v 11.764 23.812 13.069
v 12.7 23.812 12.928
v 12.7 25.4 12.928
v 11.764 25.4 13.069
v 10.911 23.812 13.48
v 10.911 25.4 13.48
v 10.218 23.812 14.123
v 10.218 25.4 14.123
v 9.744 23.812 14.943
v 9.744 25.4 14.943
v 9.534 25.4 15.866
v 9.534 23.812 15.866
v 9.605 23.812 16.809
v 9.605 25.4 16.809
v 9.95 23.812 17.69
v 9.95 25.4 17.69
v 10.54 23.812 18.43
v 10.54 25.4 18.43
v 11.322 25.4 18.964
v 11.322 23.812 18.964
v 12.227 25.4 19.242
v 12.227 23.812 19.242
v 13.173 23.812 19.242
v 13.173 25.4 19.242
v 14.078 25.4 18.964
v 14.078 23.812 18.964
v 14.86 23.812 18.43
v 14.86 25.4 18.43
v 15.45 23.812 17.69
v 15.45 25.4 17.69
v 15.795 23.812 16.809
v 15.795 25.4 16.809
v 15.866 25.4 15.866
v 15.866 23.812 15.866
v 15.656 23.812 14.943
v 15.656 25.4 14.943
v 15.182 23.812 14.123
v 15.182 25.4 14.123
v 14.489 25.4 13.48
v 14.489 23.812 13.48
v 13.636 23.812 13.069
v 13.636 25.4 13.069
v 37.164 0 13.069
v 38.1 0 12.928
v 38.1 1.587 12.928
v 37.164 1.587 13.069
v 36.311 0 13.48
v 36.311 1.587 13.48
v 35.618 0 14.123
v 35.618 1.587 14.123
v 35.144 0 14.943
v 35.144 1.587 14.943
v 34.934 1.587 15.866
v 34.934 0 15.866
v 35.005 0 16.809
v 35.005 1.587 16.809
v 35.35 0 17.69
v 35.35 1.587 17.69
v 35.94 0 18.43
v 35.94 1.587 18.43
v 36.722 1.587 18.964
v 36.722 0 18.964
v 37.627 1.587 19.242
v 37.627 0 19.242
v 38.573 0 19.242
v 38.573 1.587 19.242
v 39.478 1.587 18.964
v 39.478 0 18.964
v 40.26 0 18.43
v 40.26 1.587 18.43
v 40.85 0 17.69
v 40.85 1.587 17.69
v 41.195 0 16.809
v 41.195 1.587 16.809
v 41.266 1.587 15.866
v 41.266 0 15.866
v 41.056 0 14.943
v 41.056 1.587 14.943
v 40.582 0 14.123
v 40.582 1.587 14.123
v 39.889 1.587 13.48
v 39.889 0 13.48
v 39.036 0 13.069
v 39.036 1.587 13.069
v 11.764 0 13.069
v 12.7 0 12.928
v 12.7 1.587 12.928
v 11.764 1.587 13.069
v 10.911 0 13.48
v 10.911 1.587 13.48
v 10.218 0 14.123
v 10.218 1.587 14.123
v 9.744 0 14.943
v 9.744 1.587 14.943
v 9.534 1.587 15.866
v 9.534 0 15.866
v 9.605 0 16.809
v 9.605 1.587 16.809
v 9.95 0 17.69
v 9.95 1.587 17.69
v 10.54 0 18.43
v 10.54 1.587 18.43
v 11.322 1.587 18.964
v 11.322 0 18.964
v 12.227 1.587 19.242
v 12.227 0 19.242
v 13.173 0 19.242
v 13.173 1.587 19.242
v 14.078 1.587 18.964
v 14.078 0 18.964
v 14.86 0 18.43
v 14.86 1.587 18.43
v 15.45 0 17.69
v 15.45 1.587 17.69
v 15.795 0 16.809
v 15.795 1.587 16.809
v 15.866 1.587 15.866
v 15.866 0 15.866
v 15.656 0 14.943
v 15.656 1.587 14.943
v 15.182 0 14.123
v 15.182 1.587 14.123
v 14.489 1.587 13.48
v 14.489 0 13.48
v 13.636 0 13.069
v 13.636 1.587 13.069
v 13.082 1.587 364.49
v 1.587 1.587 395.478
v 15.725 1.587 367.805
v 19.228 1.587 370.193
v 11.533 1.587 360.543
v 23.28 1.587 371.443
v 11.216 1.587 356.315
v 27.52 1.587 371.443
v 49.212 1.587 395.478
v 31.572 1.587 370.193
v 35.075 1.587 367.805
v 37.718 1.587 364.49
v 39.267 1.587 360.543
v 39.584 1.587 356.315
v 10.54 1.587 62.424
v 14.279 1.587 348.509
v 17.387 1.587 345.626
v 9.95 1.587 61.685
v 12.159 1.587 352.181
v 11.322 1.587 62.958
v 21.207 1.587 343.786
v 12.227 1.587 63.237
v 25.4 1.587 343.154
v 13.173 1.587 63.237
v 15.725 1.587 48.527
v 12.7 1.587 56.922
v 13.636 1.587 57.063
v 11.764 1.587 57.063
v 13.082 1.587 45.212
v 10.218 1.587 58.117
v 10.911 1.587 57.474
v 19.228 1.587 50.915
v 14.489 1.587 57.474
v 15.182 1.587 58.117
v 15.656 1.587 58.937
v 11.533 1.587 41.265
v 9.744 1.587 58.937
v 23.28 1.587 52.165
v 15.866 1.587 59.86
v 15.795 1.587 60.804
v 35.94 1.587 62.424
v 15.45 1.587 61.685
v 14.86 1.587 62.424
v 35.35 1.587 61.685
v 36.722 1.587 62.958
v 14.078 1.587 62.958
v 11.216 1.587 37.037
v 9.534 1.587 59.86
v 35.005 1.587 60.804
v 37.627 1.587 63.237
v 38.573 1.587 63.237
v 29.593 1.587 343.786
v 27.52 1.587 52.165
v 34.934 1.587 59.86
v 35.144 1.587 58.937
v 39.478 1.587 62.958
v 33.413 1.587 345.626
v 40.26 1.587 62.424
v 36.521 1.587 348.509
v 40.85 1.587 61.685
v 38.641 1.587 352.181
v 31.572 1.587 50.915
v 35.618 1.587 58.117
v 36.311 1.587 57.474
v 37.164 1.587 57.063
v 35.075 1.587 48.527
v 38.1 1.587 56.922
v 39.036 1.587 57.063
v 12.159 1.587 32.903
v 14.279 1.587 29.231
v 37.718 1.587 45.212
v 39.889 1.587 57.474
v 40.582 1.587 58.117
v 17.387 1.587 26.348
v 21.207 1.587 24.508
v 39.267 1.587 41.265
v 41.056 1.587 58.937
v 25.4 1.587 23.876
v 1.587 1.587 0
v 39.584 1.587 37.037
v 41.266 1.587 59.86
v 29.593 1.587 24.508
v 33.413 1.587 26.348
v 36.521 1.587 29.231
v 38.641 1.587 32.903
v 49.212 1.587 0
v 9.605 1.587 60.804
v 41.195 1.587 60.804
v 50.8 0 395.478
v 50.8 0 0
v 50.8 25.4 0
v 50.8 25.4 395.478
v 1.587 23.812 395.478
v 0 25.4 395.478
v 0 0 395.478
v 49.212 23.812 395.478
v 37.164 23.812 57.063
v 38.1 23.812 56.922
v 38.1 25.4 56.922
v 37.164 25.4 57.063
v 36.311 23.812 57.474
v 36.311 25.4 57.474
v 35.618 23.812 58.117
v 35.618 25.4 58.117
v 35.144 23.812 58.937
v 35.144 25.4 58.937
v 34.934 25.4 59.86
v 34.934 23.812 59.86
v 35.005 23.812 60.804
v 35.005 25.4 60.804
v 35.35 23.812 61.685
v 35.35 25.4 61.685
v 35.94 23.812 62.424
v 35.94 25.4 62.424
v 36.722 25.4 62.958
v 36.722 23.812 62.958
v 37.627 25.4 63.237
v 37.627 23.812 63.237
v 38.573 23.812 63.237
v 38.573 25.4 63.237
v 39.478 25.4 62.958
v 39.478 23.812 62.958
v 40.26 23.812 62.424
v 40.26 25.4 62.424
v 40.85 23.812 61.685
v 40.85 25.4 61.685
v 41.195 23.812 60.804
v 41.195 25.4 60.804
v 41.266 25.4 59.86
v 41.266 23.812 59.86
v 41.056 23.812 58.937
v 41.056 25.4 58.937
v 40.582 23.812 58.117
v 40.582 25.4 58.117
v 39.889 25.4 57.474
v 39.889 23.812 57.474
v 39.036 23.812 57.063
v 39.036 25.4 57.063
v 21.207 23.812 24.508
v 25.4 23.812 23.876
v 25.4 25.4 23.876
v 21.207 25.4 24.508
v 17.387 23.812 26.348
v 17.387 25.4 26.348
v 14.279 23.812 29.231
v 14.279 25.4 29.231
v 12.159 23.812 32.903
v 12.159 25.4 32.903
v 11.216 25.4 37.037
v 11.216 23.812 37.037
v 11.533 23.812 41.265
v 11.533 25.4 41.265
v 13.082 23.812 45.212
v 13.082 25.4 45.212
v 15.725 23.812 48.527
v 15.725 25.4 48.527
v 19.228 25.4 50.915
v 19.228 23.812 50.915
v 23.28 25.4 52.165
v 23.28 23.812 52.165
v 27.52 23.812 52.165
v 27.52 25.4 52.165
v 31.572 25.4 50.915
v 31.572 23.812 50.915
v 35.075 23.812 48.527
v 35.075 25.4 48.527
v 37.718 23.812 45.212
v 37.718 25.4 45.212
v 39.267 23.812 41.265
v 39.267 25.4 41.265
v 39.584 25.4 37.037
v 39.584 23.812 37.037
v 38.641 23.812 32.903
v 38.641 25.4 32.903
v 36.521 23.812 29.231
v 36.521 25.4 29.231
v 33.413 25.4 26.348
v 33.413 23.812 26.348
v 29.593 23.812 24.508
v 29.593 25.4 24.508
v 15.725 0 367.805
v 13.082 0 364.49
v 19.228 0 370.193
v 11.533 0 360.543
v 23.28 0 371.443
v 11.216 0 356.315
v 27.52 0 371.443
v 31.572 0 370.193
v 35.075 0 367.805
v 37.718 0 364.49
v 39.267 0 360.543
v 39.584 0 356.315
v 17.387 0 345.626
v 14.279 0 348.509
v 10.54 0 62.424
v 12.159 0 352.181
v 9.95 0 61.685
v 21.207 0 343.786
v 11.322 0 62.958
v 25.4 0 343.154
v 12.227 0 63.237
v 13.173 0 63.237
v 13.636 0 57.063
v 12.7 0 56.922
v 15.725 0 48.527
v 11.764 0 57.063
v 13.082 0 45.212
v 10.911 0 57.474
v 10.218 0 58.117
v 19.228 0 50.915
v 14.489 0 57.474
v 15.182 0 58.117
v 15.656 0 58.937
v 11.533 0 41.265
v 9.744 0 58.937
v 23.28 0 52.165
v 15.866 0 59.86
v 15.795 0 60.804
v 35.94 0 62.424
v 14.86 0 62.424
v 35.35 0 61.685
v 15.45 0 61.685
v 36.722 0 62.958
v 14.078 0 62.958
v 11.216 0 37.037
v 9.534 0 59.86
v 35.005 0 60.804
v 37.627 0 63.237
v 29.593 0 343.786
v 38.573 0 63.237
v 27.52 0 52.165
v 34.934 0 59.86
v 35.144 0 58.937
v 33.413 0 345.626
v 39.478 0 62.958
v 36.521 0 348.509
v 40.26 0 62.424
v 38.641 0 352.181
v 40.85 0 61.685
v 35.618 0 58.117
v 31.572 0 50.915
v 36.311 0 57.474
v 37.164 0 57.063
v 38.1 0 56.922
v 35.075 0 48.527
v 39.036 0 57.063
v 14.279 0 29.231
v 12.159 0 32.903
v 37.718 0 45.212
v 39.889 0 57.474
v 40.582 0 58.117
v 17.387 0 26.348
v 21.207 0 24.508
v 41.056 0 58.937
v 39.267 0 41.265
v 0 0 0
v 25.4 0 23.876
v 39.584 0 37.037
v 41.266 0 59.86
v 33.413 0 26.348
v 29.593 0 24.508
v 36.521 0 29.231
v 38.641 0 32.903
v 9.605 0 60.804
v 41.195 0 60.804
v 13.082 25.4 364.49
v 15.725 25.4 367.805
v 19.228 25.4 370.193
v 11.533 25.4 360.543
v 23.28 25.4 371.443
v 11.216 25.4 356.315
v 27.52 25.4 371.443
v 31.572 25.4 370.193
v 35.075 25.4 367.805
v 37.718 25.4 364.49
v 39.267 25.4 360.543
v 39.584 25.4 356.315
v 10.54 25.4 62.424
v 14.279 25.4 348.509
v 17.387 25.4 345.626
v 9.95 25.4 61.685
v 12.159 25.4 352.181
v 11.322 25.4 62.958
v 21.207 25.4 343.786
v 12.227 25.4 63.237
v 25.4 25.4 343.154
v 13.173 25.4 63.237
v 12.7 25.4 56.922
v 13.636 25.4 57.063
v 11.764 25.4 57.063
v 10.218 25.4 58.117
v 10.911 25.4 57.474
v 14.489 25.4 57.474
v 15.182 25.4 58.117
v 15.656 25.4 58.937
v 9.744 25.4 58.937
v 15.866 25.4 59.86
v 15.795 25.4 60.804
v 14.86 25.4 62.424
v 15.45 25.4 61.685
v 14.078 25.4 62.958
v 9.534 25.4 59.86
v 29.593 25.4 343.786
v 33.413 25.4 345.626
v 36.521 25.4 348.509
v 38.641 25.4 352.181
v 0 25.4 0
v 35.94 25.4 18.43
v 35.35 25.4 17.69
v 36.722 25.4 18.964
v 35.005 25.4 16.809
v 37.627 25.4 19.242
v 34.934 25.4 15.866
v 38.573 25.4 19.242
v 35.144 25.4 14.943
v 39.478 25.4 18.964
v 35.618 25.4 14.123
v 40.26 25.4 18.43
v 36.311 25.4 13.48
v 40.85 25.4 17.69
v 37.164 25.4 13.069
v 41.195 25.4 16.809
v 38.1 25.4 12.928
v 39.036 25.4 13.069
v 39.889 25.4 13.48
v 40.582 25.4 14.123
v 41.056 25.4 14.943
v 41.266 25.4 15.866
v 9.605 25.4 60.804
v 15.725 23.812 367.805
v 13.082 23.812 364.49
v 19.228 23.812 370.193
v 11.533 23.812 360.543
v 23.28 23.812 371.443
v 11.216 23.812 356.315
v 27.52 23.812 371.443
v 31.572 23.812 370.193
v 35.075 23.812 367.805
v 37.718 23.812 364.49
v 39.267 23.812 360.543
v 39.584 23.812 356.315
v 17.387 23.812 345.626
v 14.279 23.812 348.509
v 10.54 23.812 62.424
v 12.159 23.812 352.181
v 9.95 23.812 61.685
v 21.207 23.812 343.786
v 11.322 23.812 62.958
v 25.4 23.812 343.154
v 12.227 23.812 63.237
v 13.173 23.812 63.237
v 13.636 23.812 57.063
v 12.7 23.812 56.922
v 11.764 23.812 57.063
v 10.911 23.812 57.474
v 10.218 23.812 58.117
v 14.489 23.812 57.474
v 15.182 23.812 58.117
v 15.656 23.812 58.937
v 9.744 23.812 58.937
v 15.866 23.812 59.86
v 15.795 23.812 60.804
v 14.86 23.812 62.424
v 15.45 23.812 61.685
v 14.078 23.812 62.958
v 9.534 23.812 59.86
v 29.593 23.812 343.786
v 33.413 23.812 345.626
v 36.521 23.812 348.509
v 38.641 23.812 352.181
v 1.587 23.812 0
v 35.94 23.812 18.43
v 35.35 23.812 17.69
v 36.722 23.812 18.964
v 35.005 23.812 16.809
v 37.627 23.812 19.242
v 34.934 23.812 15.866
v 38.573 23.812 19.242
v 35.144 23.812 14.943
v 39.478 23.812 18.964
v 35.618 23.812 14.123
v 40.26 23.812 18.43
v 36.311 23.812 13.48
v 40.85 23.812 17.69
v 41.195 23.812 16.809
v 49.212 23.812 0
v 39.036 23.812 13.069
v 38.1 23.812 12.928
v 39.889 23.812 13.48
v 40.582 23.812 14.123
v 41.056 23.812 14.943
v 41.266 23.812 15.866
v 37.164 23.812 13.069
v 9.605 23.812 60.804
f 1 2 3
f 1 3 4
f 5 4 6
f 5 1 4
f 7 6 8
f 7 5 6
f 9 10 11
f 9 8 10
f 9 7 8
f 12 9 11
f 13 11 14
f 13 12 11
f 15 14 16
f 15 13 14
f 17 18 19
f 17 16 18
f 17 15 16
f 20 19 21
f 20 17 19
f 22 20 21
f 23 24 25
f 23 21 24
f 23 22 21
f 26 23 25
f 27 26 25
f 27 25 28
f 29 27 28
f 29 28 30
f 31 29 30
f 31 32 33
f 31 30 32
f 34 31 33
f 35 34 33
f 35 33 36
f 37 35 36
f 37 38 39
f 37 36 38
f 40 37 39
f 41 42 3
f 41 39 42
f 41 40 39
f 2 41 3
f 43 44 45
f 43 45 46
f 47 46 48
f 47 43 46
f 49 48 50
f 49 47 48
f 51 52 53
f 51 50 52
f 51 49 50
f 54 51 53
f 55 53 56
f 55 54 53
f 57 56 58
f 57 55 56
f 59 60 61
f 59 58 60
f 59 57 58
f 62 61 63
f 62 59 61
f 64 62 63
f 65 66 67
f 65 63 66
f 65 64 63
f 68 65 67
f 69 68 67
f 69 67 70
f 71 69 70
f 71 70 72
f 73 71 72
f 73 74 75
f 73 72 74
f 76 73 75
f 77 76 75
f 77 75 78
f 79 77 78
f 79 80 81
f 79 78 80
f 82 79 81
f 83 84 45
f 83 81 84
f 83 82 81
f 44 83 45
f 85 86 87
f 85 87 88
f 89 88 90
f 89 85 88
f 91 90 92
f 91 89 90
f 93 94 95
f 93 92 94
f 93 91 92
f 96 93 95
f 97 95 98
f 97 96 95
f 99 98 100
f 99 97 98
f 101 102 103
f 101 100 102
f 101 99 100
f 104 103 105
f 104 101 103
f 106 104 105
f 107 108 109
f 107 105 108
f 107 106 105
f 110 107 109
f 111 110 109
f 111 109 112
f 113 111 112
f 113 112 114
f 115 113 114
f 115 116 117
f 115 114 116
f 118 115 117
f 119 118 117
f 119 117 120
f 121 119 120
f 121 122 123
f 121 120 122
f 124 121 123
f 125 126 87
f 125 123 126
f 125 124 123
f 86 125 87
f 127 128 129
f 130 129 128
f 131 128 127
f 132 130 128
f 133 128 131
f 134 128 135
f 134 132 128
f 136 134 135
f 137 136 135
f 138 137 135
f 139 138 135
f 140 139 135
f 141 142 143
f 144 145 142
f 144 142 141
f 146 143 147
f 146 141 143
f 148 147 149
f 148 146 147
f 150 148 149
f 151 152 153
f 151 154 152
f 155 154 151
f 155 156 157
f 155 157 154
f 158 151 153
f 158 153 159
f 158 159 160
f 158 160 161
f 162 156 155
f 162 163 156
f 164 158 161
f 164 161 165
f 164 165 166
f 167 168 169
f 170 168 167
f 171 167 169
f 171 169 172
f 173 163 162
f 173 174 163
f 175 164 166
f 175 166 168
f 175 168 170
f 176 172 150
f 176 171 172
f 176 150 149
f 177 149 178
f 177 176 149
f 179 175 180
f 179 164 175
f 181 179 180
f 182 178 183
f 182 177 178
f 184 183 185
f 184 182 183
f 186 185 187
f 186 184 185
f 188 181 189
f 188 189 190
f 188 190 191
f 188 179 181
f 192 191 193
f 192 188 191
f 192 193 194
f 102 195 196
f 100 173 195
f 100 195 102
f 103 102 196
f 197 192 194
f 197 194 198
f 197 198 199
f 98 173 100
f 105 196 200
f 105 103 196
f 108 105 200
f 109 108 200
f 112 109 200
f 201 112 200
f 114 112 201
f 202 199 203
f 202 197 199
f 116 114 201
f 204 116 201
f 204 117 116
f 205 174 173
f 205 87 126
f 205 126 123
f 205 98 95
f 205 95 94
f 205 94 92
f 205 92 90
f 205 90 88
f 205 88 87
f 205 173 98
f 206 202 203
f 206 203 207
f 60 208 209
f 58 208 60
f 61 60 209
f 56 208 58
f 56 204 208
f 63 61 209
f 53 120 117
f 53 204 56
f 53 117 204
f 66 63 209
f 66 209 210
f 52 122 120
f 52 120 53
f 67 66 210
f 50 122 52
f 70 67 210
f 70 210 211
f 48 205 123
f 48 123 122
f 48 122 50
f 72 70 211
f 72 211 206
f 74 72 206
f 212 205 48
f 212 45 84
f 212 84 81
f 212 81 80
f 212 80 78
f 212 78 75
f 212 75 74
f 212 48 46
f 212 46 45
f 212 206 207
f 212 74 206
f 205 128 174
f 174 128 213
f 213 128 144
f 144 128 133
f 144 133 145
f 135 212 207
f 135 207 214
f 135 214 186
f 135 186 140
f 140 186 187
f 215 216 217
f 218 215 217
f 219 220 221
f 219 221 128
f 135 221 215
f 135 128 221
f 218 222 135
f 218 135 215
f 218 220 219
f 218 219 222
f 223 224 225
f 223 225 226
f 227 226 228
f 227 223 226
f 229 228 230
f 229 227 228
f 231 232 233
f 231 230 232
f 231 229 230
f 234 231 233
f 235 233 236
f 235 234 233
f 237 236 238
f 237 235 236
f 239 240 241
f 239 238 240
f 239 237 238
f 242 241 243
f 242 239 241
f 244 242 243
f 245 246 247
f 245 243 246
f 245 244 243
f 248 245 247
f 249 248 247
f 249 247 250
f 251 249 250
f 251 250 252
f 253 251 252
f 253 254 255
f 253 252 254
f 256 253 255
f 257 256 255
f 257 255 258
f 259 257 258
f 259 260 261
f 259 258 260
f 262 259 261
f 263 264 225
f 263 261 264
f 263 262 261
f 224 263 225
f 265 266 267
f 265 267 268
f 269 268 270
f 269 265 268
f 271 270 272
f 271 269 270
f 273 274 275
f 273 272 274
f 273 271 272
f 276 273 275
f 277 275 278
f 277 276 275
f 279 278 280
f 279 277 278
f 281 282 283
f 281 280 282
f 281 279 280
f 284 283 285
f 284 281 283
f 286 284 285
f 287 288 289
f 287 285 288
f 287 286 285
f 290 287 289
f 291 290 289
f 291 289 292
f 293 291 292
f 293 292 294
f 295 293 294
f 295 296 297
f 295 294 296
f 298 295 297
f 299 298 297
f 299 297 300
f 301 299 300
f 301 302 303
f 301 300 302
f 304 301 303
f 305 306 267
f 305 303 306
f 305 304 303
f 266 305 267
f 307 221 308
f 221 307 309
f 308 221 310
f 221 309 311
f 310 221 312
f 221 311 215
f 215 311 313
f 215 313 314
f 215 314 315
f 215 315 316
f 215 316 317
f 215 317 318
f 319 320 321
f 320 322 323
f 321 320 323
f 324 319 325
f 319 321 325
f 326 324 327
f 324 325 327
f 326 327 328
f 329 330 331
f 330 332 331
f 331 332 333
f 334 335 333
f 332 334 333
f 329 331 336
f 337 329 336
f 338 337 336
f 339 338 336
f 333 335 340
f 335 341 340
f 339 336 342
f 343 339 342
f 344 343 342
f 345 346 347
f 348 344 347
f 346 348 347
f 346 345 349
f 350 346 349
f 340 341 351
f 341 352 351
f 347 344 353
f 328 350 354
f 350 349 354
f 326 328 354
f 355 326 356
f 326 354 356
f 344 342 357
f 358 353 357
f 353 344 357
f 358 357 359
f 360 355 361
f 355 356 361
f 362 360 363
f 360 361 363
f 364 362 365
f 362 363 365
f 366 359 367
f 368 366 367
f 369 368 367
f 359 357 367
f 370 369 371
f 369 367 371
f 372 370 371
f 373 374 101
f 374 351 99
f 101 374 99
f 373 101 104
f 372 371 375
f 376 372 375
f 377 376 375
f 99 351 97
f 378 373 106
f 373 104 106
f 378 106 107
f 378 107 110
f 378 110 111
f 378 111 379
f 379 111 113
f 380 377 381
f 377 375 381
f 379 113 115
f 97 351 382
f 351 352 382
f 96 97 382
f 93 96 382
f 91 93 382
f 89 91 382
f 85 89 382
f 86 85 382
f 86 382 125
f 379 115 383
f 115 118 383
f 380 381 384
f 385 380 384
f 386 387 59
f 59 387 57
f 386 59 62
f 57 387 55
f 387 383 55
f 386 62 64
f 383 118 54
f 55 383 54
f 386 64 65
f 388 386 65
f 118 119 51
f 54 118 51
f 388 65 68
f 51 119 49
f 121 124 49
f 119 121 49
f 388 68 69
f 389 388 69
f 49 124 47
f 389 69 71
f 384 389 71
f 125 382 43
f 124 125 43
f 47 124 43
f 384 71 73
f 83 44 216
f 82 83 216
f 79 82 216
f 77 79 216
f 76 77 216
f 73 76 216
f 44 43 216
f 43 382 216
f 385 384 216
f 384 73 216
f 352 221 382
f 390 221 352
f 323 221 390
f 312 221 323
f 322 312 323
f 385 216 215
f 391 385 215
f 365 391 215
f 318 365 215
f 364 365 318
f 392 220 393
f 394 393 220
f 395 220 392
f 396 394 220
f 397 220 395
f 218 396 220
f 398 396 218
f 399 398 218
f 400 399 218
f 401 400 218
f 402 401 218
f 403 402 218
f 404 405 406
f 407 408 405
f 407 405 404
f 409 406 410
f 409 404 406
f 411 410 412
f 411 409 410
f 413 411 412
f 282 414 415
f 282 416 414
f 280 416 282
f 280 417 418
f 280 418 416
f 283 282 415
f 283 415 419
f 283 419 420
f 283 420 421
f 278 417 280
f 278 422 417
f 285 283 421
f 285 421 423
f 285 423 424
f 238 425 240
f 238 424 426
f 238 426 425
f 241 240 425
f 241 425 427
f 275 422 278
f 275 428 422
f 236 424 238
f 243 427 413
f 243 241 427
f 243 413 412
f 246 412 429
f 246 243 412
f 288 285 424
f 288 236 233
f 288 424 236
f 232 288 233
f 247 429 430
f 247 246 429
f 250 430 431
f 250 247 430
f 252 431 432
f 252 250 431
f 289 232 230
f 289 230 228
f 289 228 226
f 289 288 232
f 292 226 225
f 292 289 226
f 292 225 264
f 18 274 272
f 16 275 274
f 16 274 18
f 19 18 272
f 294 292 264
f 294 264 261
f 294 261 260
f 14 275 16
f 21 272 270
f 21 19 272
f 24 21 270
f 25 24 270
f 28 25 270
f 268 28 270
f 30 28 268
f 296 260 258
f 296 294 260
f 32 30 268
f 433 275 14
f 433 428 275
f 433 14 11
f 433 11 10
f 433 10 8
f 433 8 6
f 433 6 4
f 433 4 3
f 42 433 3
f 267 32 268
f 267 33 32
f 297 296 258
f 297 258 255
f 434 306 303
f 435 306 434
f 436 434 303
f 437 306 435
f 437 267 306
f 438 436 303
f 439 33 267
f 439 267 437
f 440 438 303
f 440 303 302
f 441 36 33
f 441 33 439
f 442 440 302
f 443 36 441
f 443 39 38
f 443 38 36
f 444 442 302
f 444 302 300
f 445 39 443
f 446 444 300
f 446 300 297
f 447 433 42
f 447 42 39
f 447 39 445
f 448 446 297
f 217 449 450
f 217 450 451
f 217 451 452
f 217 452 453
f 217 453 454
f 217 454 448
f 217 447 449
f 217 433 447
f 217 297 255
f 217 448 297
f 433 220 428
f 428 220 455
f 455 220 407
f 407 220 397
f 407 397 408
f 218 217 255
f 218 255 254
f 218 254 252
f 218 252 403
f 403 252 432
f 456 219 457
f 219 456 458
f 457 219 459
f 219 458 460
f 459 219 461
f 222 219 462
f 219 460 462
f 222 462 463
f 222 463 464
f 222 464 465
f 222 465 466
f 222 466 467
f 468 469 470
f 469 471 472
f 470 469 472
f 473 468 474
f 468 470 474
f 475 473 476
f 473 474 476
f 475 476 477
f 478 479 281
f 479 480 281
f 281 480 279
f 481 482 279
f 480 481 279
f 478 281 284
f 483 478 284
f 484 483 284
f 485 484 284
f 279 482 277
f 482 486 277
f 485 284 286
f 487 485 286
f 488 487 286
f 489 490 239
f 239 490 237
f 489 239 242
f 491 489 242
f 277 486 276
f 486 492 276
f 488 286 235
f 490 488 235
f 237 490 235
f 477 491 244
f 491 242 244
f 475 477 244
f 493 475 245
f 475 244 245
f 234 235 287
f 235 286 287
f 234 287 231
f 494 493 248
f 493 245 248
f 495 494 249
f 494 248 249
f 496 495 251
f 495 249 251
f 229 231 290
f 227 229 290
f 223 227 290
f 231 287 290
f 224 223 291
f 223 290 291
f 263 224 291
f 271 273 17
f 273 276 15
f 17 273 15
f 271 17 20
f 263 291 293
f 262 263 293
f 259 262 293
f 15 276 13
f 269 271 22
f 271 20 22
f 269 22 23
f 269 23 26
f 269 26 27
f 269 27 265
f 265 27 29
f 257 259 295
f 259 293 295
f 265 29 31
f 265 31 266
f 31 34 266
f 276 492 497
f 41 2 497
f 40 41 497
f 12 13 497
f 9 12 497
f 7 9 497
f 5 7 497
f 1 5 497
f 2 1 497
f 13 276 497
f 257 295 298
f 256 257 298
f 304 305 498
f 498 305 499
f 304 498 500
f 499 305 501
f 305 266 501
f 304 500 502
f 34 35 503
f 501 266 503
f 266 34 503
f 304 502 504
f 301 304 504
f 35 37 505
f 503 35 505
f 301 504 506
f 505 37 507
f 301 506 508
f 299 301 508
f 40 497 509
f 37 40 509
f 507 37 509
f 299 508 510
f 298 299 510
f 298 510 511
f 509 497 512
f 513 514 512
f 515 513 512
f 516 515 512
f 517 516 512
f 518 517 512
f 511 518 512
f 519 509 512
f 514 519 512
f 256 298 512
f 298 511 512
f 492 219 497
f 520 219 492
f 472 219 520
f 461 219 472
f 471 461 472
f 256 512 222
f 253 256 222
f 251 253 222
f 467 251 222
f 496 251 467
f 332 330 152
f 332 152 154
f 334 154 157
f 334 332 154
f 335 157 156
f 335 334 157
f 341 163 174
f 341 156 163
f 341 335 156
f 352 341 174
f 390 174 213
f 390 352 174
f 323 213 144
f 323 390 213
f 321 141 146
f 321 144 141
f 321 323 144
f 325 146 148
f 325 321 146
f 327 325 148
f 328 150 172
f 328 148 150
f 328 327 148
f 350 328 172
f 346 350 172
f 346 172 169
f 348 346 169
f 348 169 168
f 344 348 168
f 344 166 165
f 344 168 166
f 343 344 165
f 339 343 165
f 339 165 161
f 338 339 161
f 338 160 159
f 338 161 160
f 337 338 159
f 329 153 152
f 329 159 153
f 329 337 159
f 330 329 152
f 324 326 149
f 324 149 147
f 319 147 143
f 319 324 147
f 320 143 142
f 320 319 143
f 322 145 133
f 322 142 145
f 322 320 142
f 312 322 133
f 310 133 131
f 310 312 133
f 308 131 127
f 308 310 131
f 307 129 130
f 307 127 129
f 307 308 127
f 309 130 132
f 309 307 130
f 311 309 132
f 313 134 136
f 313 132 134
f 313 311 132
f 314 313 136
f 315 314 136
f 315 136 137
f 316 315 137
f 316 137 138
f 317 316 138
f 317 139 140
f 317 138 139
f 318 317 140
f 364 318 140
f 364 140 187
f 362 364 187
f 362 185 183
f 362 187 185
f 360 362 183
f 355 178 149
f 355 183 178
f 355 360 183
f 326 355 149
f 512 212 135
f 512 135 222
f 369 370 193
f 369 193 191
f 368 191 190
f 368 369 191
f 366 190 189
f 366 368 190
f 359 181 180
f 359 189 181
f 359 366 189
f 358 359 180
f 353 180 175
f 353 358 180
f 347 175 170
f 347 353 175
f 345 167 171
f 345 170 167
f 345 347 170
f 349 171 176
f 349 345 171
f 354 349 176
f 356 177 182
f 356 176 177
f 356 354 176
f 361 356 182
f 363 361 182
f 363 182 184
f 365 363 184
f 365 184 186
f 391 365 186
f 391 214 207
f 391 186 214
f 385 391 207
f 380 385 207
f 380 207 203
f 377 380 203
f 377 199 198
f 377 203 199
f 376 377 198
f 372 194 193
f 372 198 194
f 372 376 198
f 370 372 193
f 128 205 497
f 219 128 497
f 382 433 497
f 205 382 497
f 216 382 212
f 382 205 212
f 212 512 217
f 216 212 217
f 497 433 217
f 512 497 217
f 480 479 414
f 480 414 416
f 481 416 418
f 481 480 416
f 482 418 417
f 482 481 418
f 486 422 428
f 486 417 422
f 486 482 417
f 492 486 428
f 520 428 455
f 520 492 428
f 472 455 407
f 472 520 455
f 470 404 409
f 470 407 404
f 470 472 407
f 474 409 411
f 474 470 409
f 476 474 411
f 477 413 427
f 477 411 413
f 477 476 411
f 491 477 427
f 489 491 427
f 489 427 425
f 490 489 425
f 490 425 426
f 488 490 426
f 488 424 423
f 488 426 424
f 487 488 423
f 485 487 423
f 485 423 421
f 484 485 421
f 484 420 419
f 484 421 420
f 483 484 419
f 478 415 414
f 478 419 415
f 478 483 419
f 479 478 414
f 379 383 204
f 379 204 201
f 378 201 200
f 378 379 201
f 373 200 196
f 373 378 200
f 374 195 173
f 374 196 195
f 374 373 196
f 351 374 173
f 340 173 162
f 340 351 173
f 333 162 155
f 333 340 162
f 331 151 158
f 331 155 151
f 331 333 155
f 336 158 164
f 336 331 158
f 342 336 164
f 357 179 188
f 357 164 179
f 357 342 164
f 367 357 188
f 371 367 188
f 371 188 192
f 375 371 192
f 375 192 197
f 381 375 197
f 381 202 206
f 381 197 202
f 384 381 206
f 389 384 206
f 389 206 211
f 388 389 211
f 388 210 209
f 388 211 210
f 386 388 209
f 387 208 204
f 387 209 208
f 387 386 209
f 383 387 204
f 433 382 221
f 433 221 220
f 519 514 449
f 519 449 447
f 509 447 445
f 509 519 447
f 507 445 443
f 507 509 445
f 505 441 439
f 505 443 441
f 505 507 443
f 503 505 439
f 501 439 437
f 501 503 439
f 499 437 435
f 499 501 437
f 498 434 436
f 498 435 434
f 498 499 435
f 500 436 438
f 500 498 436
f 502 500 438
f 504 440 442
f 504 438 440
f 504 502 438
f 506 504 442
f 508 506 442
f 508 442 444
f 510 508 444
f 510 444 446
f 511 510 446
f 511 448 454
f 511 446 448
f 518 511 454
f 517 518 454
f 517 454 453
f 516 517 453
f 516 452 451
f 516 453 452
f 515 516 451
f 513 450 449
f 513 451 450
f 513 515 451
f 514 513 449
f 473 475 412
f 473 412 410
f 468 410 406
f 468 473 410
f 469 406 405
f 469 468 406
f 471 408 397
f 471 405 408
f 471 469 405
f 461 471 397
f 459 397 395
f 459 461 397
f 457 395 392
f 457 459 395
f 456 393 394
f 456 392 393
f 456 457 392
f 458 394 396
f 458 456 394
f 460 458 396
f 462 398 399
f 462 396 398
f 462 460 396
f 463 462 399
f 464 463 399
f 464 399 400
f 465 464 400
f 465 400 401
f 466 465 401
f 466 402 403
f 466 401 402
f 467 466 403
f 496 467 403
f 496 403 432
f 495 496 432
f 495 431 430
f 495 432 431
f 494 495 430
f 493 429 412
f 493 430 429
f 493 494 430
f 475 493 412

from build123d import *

# Parameters (mm, degrees)
SKETCH1_W               = 50.8
SKETCH1_H               = 25.4
SKETCH1_W_2             = 47.625
SKETCH1_H_2             = 22.225
BOSS_EXTRUDE1_DEPTH     = 395.478
CUT_EXTRUDE1_DEPTH      = 400.535540952
CUT_EXTRUDE1_DEPTH_BACK = 400.535540952
SKETCH2_R               = 14.224
SKETCH2_R_2             = 3.175


with BuildPart() as part:
    # Sketch1 → Boss-Extrude1 (new body)
    with BuildSketch(Plane.XY):
        with Locations((25.4, 12.7)):
            Rectangle(SKETCH1_W, SKETCH1_H)
        with Locations((25.4, 12.7)):
            Rectangle(SKETCH1_W_2, SKETCH1_H_2, mode=Mode.SUBTRACT)
    extrude(amount=BOSS_EXTRUDE1_DEPTH)

    # Sketch2 → Cut-Extrude1 (cut, two sides: drawn at the far end of the back side and taken through both)
    with BuildSketch(Plane(origin=(0, 25.4, 0), x_dir=(1, 0, 0), z_dir=(0, 1, 0)).offset(-CUT_EXTRUDE1_DEPTH_BACK)):
        with Locations(Location((25.4, -38.1, 0), (0, 0, 90))):
            Circle(SKETCH2_R)
        with Locations(Location((12.7, -16.102954744, 0), (0, 0, 90))):
            Circle(SKETCH2_R_2)
        with Locations(Location((12.7, -60.097045256, 0), (0, 0, 90))):
            Circle(SKETCH2_R_2)
        with Locations(Location((38.1, -60.097045256, 0), (0, 0, 90))):
            Circle(SKETCH2_R_2)
        with Locations(Location((38.1, -16.102954744, 0), (0, 0, 90))):
            Circle(SKETCH2_R_2)
        with Locations(Location((25.4, -357.378, 0), (0, 0, 90))):
            Circle(SKETCH2_R)
    extrude(amount=CUT_EXTRUDE1_DEPTH + CUT_EXTRUDE1_DEPTH_BACK, mode=Mode.SUBTRACT)


solid = part.part
